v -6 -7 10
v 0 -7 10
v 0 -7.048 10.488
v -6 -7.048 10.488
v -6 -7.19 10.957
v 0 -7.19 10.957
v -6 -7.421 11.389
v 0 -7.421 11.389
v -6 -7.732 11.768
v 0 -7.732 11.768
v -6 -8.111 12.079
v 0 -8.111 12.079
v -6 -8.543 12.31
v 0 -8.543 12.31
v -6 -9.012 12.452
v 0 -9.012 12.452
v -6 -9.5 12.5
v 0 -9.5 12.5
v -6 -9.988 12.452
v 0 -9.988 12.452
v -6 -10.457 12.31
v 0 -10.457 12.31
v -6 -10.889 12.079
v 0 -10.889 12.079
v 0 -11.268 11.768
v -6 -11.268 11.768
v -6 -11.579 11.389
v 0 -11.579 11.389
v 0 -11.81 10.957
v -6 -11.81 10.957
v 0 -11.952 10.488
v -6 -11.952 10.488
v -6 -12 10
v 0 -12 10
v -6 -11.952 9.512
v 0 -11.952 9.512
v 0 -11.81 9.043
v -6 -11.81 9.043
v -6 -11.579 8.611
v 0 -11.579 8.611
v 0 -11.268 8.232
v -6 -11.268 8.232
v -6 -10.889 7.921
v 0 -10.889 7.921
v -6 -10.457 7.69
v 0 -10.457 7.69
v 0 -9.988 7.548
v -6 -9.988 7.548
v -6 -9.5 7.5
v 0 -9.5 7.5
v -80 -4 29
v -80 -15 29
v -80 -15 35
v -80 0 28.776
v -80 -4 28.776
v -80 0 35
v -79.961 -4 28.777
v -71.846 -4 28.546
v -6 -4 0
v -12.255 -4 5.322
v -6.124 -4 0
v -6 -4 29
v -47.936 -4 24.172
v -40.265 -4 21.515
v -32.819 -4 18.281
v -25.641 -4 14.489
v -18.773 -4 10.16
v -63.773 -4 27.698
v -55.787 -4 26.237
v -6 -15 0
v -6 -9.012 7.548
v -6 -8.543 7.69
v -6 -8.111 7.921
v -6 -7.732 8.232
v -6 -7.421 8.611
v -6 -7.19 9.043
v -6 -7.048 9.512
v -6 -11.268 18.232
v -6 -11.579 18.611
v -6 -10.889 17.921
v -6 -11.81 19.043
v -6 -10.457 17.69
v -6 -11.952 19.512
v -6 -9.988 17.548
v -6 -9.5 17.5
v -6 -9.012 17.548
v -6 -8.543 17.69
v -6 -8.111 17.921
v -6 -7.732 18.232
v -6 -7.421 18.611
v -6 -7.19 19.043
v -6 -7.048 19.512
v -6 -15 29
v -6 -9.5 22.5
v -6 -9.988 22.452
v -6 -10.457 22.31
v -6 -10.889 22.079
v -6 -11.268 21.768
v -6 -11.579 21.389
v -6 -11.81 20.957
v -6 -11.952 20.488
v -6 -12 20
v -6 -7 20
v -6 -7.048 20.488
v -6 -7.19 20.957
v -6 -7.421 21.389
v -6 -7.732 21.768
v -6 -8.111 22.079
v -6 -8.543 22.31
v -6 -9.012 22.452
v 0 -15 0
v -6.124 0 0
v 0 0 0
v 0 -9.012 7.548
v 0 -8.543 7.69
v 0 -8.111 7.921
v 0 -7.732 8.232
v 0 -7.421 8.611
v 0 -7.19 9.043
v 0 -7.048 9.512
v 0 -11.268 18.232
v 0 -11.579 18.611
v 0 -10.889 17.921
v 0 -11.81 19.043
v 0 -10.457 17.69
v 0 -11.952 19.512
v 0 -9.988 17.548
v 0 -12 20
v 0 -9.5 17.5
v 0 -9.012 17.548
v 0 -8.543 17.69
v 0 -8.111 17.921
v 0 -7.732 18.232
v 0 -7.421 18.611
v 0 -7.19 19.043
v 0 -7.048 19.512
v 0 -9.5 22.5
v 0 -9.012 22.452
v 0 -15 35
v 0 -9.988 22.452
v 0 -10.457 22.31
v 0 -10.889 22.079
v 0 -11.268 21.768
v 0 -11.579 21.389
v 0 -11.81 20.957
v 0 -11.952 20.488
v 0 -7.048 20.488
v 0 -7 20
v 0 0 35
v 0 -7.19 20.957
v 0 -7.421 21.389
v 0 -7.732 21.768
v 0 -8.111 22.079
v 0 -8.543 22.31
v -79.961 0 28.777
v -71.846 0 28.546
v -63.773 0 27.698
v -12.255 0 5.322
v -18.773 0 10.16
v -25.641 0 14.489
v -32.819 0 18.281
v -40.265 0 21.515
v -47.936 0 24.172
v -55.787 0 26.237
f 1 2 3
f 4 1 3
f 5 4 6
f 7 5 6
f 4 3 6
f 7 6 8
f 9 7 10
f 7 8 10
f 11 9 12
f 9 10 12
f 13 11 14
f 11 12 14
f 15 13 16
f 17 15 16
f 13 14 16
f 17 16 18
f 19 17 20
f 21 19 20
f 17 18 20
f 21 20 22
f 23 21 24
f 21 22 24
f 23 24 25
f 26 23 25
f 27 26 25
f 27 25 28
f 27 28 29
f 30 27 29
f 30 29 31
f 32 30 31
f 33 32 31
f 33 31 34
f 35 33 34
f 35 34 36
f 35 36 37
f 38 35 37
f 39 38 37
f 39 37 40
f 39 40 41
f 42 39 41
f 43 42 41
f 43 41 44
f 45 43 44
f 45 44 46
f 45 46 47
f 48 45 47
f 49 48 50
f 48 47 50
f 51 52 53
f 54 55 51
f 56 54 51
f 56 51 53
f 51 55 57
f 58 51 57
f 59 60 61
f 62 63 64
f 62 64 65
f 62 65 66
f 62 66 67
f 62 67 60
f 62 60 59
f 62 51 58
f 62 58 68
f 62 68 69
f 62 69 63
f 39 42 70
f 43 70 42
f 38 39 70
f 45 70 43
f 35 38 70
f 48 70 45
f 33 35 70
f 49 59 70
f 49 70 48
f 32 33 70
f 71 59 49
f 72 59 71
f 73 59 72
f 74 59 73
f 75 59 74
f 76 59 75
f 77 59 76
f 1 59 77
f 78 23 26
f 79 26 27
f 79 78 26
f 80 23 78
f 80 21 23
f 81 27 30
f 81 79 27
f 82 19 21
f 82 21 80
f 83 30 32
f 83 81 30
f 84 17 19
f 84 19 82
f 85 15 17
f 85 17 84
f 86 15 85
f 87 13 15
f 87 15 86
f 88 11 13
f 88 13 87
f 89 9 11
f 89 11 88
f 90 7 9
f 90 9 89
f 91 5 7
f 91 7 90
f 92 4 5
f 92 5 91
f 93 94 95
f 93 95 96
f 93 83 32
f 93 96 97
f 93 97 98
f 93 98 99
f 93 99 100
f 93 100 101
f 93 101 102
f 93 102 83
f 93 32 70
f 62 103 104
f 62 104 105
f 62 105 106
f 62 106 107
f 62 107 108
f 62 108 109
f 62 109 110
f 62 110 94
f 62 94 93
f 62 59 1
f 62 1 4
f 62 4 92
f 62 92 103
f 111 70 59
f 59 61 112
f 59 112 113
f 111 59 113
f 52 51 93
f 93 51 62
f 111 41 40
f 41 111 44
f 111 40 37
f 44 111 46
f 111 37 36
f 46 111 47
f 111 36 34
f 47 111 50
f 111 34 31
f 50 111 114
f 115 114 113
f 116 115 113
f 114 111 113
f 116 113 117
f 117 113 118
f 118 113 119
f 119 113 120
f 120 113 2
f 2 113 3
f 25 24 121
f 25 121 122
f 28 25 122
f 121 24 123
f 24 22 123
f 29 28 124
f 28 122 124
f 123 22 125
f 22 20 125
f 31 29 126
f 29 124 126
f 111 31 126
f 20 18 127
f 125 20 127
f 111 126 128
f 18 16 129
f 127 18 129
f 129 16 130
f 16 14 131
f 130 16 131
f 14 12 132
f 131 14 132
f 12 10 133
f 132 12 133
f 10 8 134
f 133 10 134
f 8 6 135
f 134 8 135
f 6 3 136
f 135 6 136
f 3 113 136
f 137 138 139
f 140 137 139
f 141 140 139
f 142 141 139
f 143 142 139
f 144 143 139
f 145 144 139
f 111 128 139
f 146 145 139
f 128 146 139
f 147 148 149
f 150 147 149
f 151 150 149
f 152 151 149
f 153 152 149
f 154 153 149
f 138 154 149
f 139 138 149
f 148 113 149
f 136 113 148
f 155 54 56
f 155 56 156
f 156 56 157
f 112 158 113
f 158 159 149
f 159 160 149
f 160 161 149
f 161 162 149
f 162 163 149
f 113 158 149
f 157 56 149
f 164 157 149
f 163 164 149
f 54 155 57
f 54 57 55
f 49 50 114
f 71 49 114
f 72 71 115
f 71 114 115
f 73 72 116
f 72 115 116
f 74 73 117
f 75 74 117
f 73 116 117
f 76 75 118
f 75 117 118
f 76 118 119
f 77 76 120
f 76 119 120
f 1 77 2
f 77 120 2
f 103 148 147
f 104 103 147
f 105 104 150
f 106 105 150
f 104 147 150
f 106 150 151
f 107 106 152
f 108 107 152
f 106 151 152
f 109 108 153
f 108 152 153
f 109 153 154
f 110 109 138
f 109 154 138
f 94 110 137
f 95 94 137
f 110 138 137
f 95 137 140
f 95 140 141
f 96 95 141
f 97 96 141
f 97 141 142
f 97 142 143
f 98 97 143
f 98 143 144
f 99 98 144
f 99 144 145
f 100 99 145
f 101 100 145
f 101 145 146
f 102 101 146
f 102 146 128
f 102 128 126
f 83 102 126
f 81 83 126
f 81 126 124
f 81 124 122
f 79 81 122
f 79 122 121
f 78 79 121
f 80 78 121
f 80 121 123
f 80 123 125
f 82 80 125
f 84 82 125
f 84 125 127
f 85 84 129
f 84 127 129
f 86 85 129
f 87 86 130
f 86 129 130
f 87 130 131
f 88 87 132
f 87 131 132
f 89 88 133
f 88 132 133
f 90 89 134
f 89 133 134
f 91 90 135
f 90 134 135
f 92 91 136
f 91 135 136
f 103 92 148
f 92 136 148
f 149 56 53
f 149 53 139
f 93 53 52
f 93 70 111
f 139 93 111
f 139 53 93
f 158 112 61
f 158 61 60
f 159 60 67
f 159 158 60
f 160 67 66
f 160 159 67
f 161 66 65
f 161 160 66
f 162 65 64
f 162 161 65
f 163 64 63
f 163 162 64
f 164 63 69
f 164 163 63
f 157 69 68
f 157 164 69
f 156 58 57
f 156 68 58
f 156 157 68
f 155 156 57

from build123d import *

# Parameters (mm, degrees)
F0_W          = 80
F0_H          = 35
F1_DEPTH      = 15
F3_START      = 4
F2_W          = 80
F2_H          = 40
F3_DEPTH      = 21
F5_DEPTH      = 25
F5_DEPTH_BACK = 25
F6_R          = 2.5
F7_DEPTH      = 25
F7_DEPTH_BACK = 25


with BuildPart() as f1:
    # F0 (on Front) → F1 (new body)
    with BuildSketch(Plane.XZ):
        with Locations((-40, 17.5)):
            Rectangle(F0_W, F0_H)
    extrude(amount=F1_DEPTH)

    # F2 (on Front) → F3 (cut)
    with BuildSketch(Plane.XZ.offset(F3_START)):
        with Locations((-46, 9)):
            Rectangle(F2_W, F2_H)
    extrude(amount=F3_DEPTH, mode=Mode.SUBTRACT)

    # F4 (on Front) → F5 (cut, two sides)
    with BuildSketch(Plane.XZ) as f5_sk:
        with BuildLine():
            Line((-6.1243288219, -12.5113828104), (-6.1243288219, 0))
            ThreePointArc((-6.1243288219, 0), (-40.2652870135, 21.5150124091), (-79.961232841, 28.7767387927))
            Line((-79.961232841, 28.7767387927), (-95.1284343701, 28.6287205464))
            Line((-95.1284343701, 28.6287205464), (-94.7269439607, -12.5113828104))
            Line((-94.7269439607, -12.5113828104), (-6.1243288219, -12.5113828104))
        make_face()
    extrude(amount=F5_DEPTH, mode=Mode.SUBTRACT)
    extrude(f5_sk.sketch, amount=-F5_DEPTH_BACK, mode=Mode.SUBTRACT)

    # F6 (on Right) → F7 (cut, two sides)
    with BuildSketch(Plane.YZ) as f7_sk:
        with Locations((-9.5, 20)):
            Circle(F6_R)
        with BuildLine():
            ThreePointArc((-9.5, 7.5), (-7.732233047, 8.232233047), (-7, 10))
            ThreePointArc((-7, 10), (-11.267766953, 11.767766953), (-9.5, 7.5))
        make_face()
    extrude(amount=F7_DEPTH, mode=Mode.SUBTRACT)
    extrude(f7_sk.sketch, amount=-F7_DEPTH_BACK, mode=Mode.SUBTRACT)


solid = f1.part
